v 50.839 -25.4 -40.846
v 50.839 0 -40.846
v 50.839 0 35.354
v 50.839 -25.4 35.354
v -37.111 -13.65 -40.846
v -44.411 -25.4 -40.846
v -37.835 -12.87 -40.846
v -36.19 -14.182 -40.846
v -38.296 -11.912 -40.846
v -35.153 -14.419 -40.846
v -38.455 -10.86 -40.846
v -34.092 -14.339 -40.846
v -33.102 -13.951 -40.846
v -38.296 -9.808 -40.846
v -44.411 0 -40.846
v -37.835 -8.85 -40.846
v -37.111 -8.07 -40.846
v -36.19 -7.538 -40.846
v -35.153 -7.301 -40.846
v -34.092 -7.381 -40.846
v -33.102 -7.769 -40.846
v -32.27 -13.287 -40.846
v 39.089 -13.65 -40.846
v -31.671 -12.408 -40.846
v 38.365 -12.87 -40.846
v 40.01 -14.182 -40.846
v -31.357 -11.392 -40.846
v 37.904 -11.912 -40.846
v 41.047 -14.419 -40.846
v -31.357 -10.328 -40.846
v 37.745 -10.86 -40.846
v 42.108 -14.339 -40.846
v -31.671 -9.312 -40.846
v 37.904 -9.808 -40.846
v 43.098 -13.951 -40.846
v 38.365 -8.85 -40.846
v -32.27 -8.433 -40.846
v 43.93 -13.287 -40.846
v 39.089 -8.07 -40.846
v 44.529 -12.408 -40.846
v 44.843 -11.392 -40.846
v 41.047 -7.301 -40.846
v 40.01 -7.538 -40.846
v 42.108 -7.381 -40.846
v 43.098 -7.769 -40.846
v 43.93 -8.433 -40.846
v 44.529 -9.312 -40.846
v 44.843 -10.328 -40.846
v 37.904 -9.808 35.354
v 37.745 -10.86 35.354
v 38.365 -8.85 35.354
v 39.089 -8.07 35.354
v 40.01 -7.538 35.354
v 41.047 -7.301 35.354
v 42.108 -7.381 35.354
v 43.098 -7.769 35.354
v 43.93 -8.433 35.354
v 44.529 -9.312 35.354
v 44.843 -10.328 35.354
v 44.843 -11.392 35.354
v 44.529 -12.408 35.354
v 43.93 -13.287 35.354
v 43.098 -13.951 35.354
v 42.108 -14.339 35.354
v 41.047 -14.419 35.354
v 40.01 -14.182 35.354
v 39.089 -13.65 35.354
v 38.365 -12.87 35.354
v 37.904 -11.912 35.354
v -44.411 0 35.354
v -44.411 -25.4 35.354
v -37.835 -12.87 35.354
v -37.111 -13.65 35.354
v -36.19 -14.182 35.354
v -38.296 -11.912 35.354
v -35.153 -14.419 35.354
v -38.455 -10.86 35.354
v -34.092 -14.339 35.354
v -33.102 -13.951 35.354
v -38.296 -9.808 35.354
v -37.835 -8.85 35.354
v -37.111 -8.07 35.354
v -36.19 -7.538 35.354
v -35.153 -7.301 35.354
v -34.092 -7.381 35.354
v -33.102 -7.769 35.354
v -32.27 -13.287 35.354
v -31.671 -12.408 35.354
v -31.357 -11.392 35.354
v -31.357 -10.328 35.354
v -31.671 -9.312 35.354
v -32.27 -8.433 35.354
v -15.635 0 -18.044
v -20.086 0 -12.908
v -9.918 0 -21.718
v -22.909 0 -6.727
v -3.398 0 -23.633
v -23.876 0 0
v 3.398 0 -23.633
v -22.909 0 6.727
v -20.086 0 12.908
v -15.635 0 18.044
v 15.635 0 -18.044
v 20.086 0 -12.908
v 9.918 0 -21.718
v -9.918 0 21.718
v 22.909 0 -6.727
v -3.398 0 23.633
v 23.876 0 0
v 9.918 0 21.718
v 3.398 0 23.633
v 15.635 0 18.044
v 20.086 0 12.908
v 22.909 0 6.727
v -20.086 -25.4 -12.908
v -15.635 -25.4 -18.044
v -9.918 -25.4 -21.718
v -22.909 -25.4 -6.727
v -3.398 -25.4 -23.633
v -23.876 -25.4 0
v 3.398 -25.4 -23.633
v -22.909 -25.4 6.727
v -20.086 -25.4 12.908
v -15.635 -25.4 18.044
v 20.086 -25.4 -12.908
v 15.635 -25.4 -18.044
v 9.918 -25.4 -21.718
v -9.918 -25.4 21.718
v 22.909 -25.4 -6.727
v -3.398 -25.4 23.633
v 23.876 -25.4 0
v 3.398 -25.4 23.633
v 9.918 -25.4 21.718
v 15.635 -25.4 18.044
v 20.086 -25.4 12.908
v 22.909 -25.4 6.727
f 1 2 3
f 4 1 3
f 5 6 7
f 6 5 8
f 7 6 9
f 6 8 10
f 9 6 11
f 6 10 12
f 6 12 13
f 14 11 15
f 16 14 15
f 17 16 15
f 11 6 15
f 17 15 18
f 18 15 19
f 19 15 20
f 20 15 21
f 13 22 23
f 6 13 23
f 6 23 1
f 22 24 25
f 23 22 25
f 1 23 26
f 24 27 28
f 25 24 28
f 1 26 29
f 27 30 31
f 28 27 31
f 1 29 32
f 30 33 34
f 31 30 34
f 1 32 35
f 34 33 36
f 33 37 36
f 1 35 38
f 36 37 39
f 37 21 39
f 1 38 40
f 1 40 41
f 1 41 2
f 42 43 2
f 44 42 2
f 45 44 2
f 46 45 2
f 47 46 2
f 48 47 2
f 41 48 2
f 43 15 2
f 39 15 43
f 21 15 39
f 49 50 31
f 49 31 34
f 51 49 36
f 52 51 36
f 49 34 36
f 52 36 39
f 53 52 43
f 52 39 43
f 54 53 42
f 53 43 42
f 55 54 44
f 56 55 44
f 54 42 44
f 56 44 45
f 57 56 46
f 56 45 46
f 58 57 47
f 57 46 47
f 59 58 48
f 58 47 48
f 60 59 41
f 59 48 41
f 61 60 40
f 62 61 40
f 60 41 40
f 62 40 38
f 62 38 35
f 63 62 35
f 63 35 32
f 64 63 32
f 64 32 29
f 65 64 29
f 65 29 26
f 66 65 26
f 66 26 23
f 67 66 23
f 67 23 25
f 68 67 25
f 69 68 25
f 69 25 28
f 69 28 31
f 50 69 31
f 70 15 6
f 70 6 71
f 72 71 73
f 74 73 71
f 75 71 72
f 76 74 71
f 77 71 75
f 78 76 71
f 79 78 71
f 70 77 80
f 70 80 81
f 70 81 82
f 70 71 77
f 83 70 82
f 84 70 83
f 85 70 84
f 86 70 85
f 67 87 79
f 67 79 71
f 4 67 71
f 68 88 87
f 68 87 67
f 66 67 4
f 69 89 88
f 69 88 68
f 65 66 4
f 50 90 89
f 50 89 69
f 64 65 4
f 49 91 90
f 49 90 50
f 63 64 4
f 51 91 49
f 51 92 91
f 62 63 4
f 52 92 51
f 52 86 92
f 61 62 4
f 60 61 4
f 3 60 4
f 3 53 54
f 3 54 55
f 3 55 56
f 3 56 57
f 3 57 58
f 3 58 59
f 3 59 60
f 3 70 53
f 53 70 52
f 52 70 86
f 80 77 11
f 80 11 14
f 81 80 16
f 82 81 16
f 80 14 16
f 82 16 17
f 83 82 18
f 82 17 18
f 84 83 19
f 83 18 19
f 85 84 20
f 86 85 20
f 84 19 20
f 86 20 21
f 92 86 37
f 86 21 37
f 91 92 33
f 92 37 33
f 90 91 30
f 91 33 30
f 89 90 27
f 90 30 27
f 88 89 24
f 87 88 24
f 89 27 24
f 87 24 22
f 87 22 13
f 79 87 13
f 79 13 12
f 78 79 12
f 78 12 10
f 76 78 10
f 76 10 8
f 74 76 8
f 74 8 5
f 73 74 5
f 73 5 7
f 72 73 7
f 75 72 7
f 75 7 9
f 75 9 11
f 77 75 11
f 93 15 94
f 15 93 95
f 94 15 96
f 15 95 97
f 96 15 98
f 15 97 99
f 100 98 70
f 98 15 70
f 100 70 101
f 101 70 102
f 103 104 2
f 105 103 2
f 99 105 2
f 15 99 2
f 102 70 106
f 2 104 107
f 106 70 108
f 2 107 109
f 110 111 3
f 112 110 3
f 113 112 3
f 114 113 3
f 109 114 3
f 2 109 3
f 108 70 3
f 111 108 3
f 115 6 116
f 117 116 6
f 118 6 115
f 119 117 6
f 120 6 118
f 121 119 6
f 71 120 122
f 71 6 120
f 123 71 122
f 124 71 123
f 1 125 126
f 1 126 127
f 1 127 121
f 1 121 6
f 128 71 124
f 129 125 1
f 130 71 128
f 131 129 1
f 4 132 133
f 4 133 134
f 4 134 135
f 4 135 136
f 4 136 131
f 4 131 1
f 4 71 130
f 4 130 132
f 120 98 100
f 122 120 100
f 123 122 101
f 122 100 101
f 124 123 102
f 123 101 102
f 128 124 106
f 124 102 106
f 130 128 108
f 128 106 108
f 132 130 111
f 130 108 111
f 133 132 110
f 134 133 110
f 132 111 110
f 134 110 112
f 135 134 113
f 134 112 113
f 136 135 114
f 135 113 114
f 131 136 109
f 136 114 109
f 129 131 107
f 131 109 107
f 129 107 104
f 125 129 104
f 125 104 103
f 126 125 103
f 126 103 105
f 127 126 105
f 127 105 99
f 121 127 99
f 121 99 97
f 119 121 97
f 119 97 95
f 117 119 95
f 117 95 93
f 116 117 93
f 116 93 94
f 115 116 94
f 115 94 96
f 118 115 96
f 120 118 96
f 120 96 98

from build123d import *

# Parameters (mm, degrees)
F0_W     = 95.25
F0_H     = 76.2
F1_DEPTH = 25.4
F3_D     = 47.752
F5_D     = 7.1374


with BuildPart() as f1:
    # F0 (on Front) → F1 (new body)
    with BuildSketch(Plane.XZ):
        with Locations((3.213696, -2.745525)):
            Rectangle(F0_W, F0_H)
    extrude(amount=F1_DEPTH)

    # F3 (through all)
    with Locations(Plane.XZ.offset(25.4)):
        with Locations((0, 0)):
            Hole(F3_D / 2)

    # F5 (through all)
    with Locations(Plane.XY.offset(35.354475)):
        with Locations((-34.886304, -10.860083), (41.313696, -10.860083)):
            Hole(F5_D / 2)


solid = f1.part
